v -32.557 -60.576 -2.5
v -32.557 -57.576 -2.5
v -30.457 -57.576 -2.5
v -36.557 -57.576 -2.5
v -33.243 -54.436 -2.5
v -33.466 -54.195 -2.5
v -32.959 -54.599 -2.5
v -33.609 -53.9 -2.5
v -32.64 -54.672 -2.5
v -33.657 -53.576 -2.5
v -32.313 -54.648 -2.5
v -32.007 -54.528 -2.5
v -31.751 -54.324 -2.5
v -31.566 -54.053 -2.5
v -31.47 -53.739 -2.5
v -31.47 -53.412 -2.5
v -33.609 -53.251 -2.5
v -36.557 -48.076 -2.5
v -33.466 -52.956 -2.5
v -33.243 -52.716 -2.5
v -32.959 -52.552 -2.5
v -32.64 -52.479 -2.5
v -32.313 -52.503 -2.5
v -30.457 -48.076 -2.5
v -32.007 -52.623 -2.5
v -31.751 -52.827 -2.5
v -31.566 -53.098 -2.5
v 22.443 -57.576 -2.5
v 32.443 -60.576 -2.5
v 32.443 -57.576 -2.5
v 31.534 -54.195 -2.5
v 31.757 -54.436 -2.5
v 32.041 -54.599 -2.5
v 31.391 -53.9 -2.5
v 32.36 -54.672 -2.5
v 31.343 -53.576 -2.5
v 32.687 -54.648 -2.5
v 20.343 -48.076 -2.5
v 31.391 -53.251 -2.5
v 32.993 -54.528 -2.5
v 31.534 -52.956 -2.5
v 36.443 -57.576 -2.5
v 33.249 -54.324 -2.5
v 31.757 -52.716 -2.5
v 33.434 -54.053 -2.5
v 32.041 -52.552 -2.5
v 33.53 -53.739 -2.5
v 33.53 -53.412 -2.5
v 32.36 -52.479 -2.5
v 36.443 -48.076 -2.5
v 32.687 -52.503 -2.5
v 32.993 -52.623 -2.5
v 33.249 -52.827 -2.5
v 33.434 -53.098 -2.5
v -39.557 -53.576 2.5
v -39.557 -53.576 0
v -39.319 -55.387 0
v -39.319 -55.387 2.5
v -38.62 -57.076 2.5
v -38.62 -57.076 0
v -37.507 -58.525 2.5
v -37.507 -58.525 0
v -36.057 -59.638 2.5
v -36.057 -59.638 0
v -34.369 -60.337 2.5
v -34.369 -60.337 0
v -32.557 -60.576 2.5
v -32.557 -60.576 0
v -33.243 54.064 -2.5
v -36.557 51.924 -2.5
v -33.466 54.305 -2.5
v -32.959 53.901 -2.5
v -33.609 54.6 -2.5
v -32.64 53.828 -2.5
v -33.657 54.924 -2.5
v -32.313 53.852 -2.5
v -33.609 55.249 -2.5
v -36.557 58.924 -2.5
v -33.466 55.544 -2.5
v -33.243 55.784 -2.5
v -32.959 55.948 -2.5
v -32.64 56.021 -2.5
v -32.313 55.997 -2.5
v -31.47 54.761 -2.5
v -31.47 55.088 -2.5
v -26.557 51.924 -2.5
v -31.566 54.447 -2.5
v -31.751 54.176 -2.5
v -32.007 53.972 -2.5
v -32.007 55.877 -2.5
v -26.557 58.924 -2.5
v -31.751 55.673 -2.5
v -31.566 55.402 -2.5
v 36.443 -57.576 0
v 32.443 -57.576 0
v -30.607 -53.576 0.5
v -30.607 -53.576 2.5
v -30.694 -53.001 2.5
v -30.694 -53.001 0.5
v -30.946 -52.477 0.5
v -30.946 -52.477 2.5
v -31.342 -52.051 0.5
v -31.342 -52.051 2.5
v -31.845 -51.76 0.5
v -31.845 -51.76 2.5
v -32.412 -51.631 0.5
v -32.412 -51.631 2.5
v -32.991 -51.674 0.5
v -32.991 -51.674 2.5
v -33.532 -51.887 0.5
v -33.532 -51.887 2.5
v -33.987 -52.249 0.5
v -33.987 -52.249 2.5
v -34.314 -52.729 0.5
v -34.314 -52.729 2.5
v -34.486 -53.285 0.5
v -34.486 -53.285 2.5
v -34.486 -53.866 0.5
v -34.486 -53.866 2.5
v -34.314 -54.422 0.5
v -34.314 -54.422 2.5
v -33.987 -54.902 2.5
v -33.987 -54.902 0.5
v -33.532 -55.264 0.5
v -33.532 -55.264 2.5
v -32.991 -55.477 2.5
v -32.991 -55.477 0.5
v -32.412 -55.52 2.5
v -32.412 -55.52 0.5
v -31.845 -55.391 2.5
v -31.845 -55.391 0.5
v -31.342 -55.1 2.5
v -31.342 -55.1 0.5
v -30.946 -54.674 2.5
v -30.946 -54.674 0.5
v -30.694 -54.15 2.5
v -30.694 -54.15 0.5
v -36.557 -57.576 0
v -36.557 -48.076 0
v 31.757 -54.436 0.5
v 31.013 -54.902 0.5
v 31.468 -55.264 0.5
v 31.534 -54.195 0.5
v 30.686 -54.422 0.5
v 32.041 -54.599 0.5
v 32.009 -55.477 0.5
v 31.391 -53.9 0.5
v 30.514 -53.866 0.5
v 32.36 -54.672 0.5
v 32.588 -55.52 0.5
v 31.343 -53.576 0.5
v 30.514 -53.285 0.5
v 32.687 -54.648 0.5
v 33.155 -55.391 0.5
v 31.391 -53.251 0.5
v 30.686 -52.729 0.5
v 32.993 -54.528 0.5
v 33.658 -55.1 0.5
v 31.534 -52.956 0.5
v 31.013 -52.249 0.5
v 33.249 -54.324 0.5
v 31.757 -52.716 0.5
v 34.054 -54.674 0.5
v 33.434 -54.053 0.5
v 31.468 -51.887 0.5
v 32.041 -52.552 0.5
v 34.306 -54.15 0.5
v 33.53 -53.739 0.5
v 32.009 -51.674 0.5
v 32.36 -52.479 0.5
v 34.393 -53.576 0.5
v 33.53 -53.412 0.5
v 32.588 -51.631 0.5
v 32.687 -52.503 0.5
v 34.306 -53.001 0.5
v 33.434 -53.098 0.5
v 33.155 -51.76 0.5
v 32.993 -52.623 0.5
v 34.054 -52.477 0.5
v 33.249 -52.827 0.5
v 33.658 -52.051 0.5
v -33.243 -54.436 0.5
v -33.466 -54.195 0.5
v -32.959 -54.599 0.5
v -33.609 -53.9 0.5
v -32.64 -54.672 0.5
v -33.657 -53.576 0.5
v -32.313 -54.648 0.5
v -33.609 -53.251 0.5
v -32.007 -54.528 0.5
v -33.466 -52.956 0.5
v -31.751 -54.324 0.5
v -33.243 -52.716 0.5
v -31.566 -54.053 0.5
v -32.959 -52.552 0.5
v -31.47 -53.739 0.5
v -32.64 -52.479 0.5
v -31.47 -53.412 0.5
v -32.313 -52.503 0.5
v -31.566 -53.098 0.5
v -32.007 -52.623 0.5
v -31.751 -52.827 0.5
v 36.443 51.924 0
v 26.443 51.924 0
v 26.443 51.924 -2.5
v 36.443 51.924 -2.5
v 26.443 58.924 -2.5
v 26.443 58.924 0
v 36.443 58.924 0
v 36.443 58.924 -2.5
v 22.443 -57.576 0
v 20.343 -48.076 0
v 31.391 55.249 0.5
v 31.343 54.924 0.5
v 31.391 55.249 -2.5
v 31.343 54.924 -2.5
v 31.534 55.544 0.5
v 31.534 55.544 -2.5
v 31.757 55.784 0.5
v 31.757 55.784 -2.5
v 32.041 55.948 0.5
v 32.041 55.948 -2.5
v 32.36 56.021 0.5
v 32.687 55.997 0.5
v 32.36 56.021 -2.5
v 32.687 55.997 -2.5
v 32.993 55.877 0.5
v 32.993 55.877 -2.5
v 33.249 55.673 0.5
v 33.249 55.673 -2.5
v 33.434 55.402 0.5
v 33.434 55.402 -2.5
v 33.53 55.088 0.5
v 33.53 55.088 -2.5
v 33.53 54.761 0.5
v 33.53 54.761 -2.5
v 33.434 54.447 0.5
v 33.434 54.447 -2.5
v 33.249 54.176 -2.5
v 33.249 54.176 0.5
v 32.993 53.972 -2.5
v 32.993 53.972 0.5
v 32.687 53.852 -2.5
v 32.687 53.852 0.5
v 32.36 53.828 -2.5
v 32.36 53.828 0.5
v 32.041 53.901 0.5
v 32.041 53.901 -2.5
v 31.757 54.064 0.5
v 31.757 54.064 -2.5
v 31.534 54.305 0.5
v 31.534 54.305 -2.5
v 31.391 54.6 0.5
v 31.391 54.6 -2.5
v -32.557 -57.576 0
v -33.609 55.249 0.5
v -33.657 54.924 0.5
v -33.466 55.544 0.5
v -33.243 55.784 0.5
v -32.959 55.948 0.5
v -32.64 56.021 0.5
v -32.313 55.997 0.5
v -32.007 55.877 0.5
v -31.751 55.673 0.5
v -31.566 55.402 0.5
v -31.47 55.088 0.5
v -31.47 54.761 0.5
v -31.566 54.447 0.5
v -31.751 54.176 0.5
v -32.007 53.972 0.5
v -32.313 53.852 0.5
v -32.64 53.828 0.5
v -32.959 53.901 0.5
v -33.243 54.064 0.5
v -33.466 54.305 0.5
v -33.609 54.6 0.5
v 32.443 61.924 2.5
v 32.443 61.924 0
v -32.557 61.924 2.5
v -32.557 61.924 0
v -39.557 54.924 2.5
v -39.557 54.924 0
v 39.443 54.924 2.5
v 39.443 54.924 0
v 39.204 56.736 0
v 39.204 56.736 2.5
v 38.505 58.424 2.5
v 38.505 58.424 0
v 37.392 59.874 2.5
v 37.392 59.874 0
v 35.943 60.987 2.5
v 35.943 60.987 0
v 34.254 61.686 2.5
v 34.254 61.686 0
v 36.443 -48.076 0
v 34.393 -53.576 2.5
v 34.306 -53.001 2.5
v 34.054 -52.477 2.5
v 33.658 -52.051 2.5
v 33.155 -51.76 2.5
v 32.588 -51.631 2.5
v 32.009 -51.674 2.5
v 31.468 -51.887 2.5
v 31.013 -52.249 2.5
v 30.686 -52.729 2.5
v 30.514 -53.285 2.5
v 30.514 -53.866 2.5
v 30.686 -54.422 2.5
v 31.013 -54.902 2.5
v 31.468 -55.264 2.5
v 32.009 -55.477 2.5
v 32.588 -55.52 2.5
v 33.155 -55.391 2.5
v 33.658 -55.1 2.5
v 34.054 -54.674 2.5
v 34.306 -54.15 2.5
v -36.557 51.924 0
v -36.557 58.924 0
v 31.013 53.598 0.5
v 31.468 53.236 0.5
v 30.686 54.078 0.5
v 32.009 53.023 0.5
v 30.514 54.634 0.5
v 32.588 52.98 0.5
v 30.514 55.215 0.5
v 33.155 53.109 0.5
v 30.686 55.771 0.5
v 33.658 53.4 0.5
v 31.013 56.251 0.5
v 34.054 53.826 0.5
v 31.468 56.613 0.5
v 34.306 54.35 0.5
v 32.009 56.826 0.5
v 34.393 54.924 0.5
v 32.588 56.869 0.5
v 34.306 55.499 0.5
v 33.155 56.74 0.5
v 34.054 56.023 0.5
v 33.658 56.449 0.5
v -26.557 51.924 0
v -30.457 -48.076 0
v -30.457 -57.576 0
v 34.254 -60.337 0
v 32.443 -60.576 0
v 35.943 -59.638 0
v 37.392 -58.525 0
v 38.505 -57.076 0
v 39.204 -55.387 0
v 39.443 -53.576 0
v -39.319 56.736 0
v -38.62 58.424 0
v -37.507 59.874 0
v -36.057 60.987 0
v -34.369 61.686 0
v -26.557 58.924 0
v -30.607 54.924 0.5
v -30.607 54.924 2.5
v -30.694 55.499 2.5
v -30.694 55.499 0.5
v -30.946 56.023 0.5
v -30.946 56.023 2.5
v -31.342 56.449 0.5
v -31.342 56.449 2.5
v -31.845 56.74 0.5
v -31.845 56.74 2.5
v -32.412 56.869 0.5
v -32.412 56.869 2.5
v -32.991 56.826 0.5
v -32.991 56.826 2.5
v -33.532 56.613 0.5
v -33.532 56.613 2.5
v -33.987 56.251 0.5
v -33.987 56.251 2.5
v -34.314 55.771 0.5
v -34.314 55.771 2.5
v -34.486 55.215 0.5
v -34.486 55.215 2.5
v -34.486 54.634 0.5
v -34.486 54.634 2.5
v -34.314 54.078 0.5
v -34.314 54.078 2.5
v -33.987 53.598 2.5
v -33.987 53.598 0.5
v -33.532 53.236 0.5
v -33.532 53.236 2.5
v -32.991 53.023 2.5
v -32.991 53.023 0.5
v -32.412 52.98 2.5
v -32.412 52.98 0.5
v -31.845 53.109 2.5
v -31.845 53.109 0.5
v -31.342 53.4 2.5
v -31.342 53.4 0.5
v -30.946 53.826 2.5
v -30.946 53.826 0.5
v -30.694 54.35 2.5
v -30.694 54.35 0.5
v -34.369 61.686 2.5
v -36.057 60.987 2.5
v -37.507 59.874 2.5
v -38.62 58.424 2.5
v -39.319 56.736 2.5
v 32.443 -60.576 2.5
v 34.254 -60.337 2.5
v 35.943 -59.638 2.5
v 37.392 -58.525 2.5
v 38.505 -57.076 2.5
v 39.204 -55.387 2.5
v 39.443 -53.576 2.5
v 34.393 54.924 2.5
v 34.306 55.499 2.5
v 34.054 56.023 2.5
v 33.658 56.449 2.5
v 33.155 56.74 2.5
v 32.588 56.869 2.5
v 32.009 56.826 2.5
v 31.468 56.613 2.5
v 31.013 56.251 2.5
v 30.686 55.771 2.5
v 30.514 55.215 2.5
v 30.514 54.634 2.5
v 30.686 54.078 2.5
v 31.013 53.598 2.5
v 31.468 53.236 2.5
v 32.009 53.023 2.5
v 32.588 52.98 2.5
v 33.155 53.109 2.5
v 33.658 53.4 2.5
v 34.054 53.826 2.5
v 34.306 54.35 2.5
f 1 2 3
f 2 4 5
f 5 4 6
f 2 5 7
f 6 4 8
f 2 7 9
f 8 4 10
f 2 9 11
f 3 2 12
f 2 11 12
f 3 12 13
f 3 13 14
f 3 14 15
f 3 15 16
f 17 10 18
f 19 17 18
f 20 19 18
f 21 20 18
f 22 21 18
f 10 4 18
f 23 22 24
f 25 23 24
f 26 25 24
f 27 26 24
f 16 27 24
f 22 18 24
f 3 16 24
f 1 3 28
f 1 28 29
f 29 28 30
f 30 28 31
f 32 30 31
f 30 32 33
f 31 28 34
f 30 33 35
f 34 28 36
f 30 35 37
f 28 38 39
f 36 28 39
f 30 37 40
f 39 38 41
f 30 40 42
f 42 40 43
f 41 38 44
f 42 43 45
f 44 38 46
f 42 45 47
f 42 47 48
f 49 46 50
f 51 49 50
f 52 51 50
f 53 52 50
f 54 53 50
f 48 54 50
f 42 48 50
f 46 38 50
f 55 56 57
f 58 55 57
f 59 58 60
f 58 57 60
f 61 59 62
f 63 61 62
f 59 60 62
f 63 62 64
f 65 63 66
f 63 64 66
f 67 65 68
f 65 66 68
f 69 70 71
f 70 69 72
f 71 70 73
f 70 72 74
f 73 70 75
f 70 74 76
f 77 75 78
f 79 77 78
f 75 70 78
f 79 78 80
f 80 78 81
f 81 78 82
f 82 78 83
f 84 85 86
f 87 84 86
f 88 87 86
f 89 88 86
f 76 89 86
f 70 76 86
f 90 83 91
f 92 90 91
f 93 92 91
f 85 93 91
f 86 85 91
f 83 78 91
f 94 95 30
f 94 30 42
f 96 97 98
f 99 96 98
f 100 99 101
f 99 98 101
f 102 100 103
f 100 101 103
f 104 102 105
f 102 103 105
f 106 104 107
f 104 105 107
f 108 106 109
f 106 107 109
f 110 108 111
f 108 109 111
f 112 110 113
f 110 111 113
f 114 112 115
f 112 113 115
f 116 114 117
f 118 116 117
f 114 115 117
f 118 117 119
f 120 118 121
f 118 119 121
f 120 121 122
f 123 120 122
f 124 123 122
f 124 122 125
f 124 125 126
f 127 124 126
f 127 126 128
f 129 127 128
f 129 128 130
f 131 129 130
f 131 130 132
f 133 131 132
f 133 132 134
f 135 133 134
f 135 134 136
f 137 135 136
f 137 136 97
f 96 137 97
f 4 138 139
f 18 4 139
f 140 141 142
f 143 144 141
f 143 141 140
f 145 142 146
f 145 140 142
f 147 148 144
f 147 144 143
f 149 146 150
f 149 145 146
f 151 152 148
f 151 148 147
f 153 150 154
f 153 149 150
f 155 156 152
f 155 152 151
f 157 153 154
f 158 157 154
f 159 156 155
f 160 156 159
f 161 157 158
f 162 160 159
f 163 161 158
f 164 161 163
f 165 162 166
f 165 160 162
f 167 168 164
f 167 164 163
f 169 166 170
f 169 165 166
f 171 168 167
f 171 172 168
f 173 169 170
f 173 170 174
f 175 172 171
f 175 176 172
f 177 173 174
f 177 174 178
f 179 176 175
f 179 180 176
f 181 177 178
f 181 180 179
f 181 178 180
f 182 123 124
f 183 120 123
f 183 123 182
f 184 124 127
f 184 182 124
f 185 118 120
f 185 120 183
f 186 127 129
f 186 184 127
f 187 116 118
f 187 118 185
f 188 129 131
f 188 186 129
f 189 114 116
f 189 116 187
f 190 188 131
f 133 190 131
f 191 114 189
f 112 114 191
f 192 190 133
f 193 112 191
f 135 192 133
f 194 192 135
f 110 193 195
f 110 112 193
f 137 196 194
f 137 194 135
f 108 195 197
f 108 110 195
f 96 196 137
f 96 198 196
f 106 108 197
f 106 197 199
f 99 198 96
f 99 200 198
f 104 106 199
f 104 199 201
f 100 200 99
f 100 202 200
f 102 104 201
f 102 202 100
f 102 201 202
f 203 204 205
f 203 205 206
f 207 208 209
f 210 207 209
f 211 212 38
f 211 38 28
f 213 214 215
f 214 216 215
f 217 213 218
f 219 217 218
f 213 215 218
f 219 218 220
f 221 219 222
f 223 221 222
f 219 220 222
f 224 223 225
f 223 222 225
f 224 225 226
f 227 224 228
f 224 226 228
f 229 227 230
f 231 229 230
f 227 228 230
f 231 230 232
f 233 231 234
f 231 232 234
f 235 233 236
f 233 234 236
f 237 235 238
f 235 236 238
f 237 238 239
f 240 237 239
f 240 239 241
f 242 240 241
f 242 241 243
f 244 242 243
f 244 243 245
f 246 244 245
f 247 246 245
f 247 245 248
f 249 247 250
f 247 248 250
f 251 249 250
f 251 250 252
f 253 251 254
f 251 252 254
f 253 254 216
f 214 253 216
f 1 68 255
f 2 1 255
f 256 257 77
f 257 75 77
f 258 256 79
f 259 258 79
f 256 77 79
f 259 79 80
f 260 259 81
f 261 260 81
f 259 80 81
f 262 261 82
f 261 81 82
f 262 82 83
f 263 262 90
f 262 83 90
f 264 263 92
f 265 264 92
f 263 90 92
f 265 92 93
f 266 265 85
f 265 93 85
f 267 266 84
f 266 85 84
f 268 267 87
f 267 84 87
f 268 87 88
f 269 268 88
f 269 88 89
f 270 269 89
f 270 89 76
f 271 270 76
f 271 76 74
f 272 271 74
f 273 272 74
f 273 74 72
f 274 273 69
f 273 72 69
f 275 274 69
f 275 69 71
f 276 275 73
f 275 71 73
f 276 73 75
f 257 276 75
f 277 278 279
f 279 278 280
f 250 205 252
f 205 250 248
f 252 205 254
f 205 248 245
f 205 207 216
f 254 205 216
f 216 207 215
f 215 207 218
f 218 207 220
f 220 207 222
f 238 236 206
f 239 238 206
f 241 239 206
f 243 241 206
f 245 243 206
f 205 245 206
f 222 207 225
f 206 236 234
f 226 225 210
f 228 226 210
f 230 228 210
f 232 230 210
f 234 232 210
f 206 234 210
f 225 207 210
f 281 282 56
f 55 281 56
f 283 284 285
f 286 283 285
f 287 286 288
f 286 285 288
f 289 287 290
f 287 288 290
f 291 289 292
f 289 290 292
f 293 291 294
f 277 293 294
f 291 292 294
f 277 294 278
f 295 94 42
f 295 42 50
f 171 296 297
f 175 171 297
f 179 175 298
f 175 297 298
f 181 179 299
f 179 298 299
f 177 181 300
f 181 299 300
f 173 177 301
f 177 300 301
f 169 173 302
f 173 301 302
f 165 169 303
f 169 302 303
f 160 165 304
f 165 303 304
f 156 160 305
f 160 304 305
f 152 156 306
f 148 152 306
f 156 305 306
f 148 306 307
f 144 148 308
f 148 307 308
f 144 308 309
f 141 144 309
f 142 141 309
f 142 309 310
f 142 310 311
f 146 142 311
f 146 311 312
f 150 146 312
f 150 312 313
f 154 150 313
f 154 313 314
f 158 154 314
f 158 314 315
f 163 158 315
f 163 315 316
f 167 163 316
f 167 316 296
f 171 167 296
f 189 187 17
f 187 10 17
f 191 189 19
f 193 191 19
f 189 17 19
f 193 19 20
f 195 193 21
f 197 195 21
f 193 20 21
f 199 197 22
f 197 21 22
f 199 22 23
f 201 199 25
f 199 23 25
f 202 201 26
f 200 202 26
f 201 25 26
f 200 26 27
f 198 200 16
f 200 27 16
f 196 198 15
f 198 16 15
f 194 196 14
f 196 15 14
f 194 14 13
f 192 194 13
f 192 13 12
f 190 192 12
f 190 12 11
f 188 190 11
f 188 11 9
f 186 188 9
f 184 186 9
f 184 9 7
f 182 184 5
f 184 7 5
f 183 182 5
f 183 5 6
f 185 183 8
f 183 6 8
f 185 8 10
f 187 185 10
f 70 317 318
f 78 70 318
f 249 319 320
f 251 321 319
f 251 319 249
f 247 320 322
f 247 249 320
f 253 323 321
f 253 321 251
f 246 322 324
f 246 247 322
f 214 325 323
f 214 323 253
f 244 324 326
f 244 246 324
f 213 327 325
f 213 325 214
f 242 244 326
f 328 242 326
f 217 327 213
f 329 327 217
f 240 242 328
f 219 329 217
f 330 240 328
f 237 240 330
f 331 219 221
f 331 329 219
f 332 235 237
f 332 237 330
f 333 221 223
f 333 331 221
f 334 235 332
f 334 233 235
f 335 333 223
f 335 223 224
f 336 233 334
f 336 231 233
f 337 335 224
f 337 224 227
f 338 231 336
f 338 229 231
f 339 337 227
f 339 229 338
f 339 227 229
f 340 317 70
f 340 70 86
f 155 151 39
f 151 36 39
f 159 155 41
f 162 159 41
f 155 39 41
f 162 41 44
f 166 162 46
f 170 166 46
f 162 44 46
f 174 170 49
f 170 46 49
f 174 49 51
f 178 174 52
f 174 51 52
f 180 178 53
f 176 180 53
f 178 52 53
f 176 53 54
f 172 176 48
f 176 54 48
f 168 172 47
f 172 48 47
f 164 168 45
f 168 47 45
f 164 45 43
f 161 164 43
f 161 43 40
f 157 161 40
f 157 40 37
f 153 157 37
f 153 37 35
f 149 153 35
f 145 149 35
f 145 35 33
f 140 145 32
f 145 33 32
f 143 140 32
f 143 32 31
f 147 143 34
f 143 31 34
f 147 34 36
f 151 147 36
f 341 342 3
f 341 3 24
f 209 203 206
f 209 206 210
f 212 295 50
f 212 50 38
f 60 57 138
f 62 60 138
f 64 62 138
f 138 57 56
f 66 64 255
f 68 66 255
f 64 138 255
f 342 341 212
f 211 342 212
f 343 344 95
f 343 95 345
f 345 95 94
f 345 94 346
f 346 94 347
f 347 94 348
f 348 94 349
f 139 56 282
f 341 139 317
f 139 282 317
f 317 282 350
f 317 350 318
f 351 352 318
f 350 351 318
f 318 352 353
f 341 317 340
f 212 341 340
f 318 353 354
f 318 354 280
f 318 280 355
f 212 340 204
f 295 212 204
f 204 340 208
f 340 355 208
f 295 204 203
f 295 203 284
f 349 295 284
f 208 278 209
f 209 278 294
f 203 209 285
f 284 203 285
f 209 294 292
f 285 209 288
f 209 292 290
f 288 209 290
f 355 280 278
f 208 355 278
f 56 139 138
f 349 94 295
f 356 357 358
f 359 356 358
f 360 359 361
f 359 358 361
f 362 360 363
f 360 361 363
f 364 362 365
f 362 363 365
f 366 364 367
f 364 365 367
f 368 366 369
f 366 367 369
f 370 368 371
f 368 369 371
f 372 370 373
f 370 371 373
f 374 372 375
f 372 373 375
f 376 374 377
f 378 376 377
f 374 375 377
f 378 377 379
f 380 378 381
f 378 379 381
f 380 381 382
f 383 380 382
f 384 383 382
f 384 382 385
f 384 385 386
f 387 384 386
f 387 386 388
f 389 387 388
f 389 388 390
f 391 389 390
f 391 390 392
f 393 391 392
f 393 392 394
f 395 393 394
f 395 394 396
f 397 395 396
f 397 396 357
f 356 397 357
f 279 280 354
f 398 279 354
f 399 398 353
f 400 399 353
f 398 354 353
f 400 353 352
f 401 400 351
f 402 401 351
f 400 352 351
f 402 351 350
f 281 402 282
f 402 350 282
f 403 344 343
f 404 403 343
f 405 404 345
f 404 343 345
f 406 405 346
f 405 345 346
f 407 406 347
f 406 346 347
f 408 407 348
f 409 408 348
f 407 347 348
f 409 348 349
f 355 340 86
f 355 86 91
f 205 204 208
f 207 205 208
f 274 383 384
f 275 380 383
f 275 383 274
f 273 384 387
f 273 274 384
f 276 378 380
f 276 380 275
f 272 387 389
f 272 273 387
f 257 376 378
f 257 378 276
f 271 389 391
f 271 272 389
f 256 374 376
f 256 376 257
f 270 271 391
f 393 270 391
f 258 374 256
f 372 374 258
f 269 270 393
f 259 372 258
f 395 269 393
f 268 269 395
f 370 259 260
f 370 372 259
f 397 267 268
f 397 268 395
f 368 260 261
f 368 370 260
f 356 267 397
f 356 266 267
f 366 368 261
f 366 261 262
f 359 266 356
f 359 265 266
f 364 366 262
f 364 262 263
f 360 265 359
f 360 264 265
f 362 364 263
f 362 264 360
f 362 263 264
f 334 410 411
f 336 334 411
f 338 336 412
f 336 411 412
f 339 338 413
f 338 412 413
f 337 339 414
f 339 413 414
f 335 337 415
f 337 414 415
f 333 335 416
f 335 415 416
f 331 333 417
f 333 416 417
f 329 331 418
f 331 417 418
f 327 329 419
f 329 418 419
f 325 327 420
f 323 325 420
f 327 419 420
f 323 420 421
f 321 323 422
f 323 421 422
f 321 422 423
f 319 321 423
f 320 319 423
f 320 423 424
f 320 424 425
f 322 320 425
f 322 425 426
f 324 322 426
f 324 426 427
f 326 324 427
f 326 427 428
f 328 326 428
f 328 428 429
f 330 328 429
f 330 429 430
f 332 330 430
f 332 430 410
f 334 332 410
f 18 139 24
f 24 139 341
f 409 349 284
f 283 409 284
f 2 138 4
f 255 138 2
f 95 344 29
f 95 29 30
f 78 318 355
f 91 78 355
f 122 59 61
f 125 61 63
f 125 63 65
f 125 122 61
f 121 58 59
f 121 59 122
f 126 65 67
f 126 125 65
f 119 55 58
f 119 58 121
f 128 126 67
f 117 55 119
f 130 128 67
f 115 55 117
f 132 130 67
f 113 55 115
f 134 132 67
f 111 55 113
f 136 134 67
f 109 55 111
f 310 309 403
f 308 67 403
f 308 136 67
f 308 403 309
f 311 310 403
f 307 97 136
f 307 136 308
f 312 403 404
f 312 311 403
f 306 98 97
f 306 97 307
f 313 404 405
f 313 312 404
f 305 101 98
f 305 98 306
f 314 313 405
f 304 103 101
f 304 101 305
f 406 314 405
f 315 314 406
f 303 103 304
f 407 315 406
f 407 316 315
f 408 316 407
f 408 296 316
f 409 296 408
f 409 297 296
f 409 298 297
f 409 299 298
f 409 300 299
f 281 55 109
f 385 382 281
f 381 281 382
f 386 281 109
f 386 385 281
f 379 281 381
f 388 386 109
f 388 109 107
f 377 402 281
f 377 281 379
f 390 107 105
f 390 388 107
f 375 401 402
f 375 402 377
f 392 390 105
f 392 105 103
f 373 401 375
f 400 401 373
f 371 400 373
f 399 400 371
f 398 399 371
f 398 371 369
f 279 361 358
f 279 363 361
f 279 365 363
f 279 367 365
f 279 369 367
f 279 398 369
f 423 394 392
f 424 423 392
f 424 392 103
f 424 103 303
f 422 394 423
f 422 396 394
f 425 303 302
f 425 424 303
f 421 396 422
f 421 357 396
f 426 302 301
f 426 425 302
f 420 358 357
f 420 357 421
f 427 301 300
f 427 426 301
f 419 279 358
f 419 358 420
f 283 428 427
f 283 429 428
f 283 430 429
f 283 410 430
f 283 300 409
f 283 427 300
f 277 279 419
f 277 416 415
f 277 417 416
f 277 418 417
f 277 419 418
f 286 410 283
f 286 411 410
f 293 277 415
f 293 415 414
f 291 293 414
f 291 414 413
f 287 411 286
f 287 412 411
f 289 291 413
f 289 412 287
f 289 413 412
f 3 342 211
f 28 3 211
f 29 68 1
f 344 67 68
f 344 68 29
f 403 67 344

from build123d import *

# Parameters (mm, degrees)
F5_DEPTH       = 2.5
F3_W           = 10
F3_H           = 7
F3_W_2         = 6.1
F3_H_2         = 9.5
F7_DEPTH       = 5
F8_D           = 2.2
F8_DEPTH       = 10
F8_CBORE_D     = 3.9
F8_CBORE_DEPTH = 2
F8_TIP         = 0.6609466809
F6_W           = 65
F6_H           = 3
F9_DEPTH       = 5


with BuildPart() as f5:
    # F0 (on Top) → F5 (new body)
    with BuildSketch(Plane.XY):
        with BuildLine():
            Line((32.4426109495, 61.9244772196), (-32.5573890505, 61.9244772196))
            ThreePointArc((-32.5573890505, 61.9244772196), (-37.5071365188, 59.8742246879), (-39.5573890505, 54.9244772196))
            Line((-39.5573890505, 54.9244772196), (-39.5573890505, -53.5755227804))
            ThreePointArc((-39.5573890505, -53.5755227804), (-37.5071365188, -58.5252702487), (-32.5573890505, -60.5755227804))
            Line((-32.5573890505, -60.5755227804), (32.4426109495, -60.5755227804))
            ThreePointArc((32.4426109495, -60.5755227804), (37.3923584178, -58.5252702487), (39.4426109495, -53.5755227804))
            Line((39.4426109495, -53.5755227804), (39.4426109495, 54.9244772196))
            ThreePointArc((39.4426109495, 54.9244772196), (37.3923584178, 59.8742246879), (32.4426109495, 61.9244772196))
        make_face()
        with BuildLine():
            ThreePointArc((-36.5573890505, 54.9244772196), (-35.3858161753, 57.7529043443), (-32.5573890505, 58.9244772196))
            Line((-32.5573890505, 58.9244772196), (32.4426109495, 58.9244772196))
            ThreePointArc((32.4426109495, 58.9244772196), (35.2710380742, 57.7529043443), (36.4426109495, 54.9244772196))
            Line((36.4426109495, 54.9244772196), (36.4426109495, -53.5755227804))
            ThreePointArc((36.4426109495, -53.5755227804), (35.2710380742, -56.4039499052), (32.4426109495, -57.5755227804))
            Line((32.4426109495, -57.5755227804), (-32.5573890505, -57.5755227804))
            ThreePointArc((-32.5573890505, -57.5755227804), (-35.3858161753, -56.4039499052), (-36.5573890505, -53.5755227804))
            Line((-36.5573890505, -53.5755227804), (-36.5573890505, 54.9244772196))
        make_face(mode=Mode.SUBTRACT)
        with BuildLine():
            Line((32.4426109495, 58.9244772196), (-32.5573890505, 58.9244772196))
            ThreePointArc((-32.5573890505, 58.9244772196), (-35.3858161753, 57.7529043443), (-36.5573890505, 54.9244772196))
            Line((-36.5573890505, 54.9244772196), (-36.5573890505, -53.5755227804))
            ThreePointArc((-36.5573890505, -53.5755227804), (-35.3858161753, -56.4039499052), (-32.5573890505, -57.5755227804))
            Line((-32.5573890505, -57.5755227804), (32.4426109495, -57.5755227804))
            ThreePointArc((32.4426109495, -57.5755227804), (35.2710380742, -56.4039499052), (36.4426109495, -53.5755227804))
            Line((36.4426109495, -53.5755227804), (36.4426109495, 54.9244772196))
            ThreePointArc((36.4426109495, 54.9244772196), (35.2710380742, 57.7529043443), (32.4426109495, 58.9244772196))
        make_face()
    extrude(amount=F5_DEPTH)

    # F3 (on offset) → F7 (join)
    with BuildSketch(Plane.XY.offset(2.5)):
        with Locations((31.4426109495, 55.4244772196)):
            Rectangle(F3_W, F3_H)
        with Locations((-31.5573890505, 55.4244772196)):
            Rectangle(F3_W, F3_H)
        with Locations((-33.5073890505, -52.8255227804)):
            Rectangle(F3_W_2, F3_H_2)
        Polygon((36.4426109495, -57.5755227804), (36.4426109495, -48.0755227804), (20.3426109495, -48.0755227804), (22.4426109495, -57.5755227804), align=None)
    extrude(amount=-F7_DEPTH)

    # F8
    with Locations(Plane.XY.offset(2.5)):
        with Locations((-32.5573890505, 54.9244772196), (32.4426109495, 54.9244772196), (32.4426109495, -53.5755227804), (-32.5573890505, -53.5755227804)):
            CounterBoreHole(F8_D / 2, F8_CBORE_D / 2, F8_CBORE_DEPTH, depth=F8_DEPTH)
            with Locations((0, 0, -(F8_DEPTH + F8_TIP / 2))):  # 118° drill point
                Cone(0, F8_D / 2, F8_TIP, mode=Mode.SUBTRACT)

    # F6 (on offset) → F9 (join)
    with BuildSketch(Plane.XY.offset(2.5)):
        with Locations((-0.0573890505, -59.0755227804)):
            Rectangle(F6_W, F6_H)
    extrude(amount=-F9_DEPTH)


solid = f5.part
